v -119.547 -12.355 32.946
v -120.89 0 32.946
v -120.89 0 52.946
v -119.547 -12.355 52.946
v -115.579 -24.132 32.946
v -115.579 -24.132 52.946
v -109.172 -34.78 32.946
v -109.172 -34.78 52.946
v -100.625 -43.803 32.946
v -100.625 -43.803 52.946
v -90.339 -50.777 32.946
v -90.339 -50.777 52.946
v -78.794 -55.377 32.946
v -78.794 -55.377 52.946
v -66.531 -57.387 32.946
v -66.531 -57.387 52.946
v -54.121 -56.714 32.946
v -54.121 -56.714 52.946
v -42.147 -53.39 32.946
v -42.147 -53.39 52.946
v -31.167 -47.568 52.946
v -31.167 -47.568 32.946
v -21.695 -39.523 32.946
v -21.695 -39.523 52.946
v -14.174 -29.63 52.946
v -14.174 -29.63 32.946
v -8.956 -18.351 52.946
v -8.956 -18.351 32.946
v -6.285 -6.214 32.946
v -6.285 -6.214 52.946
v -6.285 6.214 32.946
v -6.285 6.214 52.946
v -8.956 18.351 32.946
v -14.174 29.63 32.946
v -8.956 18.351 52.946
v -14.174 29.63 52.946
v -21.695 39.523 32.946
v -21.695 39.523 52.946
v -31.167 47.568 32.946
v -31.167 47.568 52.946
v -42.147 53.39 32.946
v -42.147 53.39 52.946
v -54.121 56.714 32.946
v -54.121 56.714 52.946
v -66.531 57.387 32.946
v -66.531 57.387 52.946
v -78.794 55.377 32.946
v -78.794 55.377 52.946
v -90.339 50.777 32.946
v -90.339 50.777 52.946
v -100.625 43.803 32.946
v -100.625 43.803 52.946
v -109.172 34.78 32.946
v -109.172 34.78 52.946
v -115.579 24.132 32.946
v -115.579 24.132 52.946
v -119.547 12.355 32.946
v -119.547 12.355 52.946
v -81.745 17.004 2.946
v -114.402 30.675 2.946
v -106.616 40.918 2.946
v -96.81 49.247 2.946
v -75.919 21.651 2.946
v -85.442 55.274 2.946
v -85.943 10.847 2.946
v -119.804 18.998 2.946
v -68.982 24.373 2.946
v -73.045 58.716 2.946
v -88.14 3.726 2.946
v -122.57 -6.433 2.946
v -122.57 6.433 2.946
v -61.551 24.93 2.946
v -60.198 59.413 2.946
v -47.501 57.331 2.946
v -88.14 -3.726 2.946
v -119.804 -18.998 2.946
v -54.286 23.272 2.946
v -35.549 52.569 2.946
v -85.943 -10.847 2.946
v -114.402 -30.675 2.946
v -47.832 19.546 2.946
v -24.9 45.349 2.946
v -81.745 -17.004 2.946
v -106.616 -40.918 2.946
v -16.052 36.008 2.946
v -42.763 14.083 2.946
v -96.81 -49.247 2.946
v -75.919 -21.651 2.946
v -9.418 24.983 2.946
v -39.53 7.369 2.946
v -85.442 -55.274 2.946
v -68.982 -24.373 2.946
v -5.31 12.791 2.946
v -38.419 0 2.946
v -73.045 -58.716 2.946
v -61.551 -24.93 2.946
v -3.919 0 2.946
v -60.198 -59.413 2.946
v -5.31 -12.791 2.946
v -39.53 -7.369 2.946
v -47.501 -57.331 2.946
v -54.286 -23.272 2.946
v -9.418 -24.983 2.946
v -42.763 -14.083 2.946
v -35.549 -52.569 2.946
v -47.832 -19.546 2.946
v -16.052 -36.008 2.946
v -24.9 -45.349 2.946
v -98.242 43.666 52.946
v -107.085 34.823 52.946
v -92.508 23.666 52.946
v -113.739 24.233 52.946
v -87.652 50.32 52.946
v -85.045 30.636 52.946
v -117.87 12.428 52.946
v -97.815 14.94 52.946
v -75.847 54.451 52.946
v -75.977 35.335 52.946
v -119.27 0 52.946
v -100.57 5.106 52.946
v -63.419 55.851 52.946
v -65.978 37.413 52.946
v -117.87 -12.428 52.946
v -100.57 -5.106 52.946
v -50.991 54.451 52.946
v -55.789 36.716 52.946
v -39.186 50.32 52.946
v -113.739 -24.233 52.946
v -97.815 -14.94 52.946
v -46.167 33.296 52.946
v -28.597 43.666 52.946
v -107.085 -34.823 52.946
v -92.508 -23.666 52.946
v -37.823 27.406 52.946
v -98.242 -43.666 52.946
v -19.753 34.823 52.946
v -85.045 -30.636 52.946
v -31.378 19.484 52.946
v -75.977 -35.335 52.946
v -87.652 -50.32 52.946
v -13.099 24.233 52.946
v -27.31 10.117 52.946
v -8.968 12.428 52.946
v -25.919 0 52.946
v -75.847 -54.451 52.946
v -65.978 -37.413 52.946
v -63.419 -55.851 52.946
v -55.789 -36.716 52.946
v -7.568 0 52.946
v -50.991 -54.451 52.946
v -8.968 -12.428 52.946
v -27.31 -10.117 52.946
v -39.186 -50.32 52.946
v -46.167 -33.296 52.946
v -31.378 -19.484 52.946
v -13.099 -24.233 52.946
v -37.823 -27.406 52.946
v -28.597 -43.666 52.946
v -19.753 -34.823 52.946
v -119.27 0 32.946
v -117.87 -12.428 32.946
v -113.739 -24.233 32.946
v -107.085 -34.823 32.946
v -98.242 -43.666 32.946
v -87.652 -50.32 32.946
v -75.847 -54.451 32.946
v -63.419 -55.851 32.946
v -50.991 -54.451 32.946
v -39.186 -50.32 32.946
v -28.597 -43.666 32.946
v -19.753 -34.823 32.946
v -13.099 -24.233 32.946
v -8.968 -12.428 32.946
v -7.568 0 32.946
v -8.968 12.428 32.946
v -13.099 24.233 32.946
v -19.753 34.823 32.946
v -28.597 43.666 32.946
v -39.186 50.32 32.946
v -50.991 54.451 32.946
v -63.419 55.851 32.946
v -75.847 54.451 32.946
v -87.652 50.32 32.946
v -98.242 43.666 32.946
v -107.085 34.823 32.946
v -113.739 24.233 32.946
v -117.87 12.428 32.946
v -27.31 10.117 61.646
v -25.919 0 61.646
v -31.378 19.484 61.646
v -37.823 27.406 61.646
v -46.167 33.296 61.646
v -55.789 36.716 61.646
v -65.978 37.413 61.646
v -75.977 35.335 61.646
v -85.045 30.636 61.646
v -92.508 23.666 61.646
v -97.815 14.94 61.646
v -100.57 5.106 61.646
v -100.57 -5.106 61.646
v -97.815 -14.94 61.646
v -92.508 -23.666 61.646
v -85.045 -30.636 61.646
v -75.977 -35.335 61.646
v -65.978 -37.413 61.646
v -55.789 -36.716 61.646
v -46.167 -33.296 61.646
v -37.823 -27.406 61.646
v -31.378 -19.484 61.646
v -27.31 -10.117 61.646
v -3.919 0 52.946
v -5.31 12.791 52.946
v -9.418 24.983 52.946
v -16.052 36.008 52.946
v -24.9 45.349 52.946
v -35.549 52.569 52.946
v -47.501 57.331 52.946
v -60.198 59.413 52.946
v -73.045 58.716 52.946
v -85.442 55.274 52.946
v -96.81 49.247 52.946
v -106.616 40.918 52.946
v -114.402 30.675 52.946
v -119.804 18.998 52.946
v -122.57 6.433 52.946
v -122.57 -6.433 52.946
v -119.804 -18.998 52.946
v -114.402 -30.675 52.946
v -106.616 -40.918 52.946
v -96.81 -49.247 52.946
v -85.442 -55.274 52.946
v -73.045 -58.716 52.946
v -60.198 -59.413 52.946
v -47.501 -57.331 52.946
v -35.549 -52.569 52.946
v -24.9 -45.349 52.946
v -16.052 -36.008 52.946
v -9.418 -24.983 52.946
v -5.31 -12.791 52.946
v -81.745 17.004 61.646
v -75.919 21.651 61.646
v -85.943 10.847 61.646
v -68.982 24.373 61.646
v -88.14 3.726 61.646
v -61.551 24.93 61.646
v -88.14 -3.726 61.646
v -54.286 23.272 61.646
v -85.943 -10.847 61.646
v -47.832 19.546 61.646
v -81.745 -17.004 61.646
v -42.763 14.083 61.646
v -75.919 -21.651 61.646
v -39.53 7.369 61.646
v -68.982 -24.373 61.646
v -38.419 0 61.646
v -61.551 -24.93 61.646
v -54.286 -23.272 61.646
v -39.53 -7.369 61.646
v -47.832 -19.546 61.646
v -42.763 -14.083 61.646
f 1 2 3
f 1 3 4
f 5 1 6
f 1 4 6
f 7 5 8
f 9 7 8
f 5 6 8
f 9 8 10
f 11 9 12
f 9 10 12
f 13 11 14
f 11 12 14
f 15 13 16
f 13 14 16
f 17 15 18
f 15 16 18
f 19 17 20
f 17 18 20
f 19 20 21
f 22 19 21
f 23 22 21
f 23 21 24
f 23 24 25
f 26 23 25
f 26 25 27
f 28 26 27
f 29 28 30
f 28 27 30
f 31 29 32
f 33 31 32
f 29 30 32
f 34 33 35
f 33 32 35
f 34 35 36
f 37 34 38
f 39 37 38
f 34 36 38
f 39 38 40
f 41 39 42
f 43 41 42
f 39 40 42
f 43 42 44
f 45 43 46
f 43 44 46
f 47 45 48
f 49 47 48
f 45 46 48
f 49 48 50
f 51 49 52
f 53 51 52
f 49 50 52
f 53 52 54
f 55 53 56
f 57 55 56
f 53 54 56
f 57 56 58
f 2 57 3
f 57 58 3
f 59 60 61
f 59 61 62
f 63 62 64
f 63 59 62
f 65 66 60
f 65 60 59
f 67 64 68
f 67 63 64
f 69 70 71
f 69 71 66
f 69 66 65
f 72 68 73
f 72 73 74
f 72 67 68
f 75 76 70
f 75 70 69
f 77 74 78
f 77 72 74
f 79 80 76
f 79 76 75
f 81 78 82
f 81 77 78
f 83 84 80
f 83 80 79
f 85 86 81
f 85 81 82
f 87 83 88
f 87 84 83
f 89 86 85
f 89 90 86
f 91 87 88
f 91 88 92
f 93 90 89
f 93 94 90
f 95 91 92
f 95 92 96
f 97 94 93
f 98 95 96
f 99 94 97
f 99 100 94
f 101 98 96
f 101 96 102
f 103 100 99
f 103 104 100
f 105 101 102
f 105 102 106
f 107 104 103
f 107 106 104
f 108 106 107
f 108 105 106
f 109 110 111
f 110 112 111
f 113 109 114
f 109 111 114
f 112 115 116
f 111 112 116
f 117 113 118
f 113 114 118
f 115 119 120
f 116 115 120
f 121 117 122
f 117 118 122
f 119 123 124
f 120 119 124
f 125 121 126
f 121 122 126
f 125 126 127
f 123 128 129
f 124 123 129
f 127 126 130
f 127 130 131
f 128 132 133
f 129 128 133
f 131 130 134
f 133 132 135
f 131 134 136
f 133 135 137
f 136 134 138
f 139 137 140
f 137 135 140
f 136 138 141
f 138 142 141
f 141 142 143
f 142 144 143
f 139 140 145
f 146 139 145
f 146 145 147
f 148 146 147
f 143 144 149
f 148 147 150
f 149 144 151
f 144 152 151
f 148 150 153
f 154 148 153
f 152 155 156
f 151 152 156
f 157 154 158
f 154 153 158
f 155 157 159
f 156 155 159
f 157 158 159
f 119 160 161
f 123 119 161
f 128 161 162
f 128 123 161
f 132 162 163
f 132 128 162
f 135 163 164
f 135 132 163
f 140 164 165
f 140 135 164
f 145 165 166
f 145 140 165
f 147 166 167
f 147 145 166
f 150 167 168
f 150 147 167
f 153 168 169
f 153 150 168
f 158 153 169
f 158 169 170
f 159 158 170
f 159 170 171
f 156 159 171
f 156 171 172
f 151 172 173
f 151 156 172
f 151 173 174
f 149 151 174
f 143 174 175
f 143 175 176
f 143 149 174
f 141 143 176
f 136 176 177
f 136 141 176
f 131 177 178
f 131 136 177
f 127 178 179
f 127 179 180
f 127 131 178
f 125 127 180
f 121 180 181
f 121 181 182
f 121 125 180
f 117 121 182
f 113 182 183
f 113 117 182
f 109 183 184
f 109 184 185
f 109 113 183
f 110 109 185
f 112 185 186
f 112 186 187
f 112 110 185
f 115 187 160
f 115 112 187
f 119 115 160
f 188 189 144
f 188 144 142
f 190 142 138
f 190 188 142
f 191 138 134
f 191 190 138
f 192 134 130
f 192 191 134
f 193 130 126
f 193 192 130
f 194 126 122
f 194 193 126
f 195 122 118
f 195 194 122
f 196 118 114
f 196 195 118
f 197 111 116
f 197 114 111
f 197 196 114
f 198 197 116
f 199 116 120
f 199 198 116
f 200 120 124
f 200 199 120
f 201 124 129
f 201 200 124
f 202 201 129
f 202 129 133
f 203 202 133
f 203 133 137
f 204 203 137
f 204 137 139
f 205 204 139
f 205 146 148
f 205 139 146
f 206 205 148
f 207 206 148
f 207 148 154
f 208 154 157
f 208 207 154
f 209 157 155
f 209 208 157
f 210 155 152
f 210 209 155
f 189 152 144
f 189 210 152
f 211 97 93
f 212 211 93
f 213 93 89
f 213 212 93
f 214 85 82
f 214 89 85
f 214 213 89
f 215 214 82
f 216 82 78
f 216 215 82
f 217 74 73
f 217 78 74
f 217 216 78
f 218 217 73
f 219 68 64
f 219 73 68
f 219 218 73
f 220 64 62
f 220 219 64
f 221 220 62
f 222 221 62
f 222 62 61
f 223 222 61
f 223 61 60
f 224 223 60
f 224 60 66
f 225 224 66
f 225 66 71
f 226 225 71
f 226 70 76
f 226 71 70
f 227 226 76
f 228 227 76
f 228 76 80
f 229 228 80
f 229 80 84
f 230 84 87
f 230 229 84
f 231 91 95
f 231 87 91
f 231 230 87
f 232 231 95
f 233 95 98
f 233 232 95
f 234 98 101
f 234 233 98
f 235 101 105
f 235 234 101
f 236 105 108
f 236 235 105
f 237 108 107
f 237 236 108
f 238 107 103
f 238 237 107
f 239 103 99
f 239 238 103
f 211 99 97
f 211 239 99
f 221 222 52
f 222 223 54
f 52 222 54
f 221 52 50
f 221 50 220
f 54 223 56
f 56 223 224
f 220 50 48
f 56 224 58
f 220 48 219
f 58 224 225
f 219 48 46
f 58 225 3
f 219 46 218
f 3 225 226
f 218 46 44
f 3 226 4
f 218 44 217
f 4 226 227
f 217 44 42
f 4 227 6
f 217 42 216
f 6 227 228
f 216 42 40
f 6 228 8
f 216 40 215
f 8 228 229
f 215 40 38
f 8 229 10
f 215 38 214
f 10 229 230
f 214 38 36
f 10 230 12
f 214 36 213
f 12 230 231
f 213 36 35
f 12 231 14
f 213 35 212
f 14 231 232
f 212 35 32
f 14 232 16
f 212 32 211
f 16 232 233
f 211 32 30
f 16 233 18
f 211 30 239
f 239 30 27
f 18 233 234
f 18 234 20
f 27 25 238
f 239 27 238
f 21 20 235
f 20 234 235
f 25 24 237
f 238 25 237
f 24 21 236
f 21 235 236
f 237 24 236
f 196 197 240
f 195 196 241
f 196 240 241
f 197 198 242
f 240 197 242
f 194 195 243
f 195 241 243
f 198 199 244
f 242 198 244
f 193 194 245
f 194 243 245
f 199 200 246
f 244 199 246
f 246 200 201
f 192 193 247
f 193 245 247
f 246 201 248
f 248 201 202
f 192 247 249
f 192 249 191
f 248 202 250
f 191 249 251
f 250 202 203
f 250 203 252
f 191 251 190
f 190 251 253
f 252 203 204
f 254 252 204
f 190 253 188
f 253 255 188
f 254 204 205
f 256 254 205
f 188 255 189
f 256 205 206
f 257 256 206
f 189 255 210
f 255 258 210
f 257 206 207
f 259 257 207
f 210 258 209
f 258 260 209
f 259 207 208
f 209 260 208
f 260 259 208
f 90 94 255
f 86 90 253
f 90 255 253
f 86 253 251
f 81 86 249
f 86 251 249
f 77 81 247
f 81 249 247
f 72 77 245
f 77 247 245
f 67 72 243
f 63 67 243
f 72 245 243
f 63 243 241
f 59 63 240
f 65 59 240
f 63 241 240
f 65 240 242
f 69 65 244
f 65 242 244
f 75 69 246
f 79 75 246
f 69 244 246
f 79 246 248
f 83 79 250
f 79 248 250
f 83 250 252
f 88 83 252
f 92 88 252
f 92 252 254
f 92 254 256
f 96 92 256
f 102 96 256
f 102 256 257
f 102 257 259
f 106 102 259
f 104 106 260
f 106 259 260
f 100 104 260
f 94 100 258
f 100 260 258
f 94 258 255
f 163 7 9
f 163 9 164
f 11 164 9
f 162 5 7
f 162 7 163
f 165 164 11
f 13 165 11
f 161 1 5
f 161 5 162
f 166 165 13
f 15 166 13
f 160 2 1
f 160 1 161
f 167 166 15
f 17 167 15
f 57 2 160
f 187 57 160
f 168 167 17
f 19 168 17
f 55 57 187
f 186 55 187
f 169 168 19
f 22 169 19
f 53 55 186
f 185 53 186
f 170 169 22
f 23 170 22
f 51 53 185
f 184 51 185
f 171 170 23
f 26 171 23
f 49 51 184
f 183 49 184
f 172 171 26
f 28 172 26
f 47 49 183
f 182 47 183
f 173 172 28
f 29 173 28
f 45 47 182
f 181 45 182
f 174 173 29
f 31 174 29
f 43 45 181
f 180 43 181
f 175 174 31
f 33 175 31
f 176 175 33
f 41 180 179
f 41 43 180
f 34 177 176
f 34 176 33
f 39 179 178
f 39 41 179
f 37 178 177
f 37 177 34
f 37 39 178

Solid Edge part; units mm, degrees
sketch "Sketch1" plane through (0, 0, 0) normal (0, -1, 0) x (1, 0, 0)
  line L0 (-63.4191, 2.9465) -> (-3.9191, 2.9465)
  line L1 (-3.9191, 2.9465) -> (-3.9191, 52.9465)
  line L2 (-3.9191, 52.9465) -> (-25.9191, 52.9465)
  line L3 (-25.9191, 52.9465) -> (-25.9191, 61.6465)
  line L4 (-25.9191, 61.6465) -> (-63.4191, 61.6465)
  dimension "D1" = 59.5
  dimension "D2" = 50
  dimension "D3" = 37.5
  dimension "D4" = 8.7
revolve "RevolvedProtrusion1" add sketch "Sketch1" angle 360 about axis through (-63.4191, 0, 61.6465) along (0, 0, -1)
sketch "Sketch2" plane through (-63.4191, 0, 61.6465) normal (0, 0, 1) x (1, 0, 0)
  circle A0 centre (0, 0) radius 25
  dimension "D1" = 50
extrude "Cutout1" cut sketch "Sketch2" against normal through all
sketch "Sketch3" plane through (-63.4191, 0, 52.9465) normal (0, 0, 1) x (-1, 0, 0)
  circle A0 centre (0, 0) radius 55.8511
  circle A1 centre (0, 0) radius 57.4714
extrude "Cutout2" cut sketch "Sketch3" against normal blind 20
